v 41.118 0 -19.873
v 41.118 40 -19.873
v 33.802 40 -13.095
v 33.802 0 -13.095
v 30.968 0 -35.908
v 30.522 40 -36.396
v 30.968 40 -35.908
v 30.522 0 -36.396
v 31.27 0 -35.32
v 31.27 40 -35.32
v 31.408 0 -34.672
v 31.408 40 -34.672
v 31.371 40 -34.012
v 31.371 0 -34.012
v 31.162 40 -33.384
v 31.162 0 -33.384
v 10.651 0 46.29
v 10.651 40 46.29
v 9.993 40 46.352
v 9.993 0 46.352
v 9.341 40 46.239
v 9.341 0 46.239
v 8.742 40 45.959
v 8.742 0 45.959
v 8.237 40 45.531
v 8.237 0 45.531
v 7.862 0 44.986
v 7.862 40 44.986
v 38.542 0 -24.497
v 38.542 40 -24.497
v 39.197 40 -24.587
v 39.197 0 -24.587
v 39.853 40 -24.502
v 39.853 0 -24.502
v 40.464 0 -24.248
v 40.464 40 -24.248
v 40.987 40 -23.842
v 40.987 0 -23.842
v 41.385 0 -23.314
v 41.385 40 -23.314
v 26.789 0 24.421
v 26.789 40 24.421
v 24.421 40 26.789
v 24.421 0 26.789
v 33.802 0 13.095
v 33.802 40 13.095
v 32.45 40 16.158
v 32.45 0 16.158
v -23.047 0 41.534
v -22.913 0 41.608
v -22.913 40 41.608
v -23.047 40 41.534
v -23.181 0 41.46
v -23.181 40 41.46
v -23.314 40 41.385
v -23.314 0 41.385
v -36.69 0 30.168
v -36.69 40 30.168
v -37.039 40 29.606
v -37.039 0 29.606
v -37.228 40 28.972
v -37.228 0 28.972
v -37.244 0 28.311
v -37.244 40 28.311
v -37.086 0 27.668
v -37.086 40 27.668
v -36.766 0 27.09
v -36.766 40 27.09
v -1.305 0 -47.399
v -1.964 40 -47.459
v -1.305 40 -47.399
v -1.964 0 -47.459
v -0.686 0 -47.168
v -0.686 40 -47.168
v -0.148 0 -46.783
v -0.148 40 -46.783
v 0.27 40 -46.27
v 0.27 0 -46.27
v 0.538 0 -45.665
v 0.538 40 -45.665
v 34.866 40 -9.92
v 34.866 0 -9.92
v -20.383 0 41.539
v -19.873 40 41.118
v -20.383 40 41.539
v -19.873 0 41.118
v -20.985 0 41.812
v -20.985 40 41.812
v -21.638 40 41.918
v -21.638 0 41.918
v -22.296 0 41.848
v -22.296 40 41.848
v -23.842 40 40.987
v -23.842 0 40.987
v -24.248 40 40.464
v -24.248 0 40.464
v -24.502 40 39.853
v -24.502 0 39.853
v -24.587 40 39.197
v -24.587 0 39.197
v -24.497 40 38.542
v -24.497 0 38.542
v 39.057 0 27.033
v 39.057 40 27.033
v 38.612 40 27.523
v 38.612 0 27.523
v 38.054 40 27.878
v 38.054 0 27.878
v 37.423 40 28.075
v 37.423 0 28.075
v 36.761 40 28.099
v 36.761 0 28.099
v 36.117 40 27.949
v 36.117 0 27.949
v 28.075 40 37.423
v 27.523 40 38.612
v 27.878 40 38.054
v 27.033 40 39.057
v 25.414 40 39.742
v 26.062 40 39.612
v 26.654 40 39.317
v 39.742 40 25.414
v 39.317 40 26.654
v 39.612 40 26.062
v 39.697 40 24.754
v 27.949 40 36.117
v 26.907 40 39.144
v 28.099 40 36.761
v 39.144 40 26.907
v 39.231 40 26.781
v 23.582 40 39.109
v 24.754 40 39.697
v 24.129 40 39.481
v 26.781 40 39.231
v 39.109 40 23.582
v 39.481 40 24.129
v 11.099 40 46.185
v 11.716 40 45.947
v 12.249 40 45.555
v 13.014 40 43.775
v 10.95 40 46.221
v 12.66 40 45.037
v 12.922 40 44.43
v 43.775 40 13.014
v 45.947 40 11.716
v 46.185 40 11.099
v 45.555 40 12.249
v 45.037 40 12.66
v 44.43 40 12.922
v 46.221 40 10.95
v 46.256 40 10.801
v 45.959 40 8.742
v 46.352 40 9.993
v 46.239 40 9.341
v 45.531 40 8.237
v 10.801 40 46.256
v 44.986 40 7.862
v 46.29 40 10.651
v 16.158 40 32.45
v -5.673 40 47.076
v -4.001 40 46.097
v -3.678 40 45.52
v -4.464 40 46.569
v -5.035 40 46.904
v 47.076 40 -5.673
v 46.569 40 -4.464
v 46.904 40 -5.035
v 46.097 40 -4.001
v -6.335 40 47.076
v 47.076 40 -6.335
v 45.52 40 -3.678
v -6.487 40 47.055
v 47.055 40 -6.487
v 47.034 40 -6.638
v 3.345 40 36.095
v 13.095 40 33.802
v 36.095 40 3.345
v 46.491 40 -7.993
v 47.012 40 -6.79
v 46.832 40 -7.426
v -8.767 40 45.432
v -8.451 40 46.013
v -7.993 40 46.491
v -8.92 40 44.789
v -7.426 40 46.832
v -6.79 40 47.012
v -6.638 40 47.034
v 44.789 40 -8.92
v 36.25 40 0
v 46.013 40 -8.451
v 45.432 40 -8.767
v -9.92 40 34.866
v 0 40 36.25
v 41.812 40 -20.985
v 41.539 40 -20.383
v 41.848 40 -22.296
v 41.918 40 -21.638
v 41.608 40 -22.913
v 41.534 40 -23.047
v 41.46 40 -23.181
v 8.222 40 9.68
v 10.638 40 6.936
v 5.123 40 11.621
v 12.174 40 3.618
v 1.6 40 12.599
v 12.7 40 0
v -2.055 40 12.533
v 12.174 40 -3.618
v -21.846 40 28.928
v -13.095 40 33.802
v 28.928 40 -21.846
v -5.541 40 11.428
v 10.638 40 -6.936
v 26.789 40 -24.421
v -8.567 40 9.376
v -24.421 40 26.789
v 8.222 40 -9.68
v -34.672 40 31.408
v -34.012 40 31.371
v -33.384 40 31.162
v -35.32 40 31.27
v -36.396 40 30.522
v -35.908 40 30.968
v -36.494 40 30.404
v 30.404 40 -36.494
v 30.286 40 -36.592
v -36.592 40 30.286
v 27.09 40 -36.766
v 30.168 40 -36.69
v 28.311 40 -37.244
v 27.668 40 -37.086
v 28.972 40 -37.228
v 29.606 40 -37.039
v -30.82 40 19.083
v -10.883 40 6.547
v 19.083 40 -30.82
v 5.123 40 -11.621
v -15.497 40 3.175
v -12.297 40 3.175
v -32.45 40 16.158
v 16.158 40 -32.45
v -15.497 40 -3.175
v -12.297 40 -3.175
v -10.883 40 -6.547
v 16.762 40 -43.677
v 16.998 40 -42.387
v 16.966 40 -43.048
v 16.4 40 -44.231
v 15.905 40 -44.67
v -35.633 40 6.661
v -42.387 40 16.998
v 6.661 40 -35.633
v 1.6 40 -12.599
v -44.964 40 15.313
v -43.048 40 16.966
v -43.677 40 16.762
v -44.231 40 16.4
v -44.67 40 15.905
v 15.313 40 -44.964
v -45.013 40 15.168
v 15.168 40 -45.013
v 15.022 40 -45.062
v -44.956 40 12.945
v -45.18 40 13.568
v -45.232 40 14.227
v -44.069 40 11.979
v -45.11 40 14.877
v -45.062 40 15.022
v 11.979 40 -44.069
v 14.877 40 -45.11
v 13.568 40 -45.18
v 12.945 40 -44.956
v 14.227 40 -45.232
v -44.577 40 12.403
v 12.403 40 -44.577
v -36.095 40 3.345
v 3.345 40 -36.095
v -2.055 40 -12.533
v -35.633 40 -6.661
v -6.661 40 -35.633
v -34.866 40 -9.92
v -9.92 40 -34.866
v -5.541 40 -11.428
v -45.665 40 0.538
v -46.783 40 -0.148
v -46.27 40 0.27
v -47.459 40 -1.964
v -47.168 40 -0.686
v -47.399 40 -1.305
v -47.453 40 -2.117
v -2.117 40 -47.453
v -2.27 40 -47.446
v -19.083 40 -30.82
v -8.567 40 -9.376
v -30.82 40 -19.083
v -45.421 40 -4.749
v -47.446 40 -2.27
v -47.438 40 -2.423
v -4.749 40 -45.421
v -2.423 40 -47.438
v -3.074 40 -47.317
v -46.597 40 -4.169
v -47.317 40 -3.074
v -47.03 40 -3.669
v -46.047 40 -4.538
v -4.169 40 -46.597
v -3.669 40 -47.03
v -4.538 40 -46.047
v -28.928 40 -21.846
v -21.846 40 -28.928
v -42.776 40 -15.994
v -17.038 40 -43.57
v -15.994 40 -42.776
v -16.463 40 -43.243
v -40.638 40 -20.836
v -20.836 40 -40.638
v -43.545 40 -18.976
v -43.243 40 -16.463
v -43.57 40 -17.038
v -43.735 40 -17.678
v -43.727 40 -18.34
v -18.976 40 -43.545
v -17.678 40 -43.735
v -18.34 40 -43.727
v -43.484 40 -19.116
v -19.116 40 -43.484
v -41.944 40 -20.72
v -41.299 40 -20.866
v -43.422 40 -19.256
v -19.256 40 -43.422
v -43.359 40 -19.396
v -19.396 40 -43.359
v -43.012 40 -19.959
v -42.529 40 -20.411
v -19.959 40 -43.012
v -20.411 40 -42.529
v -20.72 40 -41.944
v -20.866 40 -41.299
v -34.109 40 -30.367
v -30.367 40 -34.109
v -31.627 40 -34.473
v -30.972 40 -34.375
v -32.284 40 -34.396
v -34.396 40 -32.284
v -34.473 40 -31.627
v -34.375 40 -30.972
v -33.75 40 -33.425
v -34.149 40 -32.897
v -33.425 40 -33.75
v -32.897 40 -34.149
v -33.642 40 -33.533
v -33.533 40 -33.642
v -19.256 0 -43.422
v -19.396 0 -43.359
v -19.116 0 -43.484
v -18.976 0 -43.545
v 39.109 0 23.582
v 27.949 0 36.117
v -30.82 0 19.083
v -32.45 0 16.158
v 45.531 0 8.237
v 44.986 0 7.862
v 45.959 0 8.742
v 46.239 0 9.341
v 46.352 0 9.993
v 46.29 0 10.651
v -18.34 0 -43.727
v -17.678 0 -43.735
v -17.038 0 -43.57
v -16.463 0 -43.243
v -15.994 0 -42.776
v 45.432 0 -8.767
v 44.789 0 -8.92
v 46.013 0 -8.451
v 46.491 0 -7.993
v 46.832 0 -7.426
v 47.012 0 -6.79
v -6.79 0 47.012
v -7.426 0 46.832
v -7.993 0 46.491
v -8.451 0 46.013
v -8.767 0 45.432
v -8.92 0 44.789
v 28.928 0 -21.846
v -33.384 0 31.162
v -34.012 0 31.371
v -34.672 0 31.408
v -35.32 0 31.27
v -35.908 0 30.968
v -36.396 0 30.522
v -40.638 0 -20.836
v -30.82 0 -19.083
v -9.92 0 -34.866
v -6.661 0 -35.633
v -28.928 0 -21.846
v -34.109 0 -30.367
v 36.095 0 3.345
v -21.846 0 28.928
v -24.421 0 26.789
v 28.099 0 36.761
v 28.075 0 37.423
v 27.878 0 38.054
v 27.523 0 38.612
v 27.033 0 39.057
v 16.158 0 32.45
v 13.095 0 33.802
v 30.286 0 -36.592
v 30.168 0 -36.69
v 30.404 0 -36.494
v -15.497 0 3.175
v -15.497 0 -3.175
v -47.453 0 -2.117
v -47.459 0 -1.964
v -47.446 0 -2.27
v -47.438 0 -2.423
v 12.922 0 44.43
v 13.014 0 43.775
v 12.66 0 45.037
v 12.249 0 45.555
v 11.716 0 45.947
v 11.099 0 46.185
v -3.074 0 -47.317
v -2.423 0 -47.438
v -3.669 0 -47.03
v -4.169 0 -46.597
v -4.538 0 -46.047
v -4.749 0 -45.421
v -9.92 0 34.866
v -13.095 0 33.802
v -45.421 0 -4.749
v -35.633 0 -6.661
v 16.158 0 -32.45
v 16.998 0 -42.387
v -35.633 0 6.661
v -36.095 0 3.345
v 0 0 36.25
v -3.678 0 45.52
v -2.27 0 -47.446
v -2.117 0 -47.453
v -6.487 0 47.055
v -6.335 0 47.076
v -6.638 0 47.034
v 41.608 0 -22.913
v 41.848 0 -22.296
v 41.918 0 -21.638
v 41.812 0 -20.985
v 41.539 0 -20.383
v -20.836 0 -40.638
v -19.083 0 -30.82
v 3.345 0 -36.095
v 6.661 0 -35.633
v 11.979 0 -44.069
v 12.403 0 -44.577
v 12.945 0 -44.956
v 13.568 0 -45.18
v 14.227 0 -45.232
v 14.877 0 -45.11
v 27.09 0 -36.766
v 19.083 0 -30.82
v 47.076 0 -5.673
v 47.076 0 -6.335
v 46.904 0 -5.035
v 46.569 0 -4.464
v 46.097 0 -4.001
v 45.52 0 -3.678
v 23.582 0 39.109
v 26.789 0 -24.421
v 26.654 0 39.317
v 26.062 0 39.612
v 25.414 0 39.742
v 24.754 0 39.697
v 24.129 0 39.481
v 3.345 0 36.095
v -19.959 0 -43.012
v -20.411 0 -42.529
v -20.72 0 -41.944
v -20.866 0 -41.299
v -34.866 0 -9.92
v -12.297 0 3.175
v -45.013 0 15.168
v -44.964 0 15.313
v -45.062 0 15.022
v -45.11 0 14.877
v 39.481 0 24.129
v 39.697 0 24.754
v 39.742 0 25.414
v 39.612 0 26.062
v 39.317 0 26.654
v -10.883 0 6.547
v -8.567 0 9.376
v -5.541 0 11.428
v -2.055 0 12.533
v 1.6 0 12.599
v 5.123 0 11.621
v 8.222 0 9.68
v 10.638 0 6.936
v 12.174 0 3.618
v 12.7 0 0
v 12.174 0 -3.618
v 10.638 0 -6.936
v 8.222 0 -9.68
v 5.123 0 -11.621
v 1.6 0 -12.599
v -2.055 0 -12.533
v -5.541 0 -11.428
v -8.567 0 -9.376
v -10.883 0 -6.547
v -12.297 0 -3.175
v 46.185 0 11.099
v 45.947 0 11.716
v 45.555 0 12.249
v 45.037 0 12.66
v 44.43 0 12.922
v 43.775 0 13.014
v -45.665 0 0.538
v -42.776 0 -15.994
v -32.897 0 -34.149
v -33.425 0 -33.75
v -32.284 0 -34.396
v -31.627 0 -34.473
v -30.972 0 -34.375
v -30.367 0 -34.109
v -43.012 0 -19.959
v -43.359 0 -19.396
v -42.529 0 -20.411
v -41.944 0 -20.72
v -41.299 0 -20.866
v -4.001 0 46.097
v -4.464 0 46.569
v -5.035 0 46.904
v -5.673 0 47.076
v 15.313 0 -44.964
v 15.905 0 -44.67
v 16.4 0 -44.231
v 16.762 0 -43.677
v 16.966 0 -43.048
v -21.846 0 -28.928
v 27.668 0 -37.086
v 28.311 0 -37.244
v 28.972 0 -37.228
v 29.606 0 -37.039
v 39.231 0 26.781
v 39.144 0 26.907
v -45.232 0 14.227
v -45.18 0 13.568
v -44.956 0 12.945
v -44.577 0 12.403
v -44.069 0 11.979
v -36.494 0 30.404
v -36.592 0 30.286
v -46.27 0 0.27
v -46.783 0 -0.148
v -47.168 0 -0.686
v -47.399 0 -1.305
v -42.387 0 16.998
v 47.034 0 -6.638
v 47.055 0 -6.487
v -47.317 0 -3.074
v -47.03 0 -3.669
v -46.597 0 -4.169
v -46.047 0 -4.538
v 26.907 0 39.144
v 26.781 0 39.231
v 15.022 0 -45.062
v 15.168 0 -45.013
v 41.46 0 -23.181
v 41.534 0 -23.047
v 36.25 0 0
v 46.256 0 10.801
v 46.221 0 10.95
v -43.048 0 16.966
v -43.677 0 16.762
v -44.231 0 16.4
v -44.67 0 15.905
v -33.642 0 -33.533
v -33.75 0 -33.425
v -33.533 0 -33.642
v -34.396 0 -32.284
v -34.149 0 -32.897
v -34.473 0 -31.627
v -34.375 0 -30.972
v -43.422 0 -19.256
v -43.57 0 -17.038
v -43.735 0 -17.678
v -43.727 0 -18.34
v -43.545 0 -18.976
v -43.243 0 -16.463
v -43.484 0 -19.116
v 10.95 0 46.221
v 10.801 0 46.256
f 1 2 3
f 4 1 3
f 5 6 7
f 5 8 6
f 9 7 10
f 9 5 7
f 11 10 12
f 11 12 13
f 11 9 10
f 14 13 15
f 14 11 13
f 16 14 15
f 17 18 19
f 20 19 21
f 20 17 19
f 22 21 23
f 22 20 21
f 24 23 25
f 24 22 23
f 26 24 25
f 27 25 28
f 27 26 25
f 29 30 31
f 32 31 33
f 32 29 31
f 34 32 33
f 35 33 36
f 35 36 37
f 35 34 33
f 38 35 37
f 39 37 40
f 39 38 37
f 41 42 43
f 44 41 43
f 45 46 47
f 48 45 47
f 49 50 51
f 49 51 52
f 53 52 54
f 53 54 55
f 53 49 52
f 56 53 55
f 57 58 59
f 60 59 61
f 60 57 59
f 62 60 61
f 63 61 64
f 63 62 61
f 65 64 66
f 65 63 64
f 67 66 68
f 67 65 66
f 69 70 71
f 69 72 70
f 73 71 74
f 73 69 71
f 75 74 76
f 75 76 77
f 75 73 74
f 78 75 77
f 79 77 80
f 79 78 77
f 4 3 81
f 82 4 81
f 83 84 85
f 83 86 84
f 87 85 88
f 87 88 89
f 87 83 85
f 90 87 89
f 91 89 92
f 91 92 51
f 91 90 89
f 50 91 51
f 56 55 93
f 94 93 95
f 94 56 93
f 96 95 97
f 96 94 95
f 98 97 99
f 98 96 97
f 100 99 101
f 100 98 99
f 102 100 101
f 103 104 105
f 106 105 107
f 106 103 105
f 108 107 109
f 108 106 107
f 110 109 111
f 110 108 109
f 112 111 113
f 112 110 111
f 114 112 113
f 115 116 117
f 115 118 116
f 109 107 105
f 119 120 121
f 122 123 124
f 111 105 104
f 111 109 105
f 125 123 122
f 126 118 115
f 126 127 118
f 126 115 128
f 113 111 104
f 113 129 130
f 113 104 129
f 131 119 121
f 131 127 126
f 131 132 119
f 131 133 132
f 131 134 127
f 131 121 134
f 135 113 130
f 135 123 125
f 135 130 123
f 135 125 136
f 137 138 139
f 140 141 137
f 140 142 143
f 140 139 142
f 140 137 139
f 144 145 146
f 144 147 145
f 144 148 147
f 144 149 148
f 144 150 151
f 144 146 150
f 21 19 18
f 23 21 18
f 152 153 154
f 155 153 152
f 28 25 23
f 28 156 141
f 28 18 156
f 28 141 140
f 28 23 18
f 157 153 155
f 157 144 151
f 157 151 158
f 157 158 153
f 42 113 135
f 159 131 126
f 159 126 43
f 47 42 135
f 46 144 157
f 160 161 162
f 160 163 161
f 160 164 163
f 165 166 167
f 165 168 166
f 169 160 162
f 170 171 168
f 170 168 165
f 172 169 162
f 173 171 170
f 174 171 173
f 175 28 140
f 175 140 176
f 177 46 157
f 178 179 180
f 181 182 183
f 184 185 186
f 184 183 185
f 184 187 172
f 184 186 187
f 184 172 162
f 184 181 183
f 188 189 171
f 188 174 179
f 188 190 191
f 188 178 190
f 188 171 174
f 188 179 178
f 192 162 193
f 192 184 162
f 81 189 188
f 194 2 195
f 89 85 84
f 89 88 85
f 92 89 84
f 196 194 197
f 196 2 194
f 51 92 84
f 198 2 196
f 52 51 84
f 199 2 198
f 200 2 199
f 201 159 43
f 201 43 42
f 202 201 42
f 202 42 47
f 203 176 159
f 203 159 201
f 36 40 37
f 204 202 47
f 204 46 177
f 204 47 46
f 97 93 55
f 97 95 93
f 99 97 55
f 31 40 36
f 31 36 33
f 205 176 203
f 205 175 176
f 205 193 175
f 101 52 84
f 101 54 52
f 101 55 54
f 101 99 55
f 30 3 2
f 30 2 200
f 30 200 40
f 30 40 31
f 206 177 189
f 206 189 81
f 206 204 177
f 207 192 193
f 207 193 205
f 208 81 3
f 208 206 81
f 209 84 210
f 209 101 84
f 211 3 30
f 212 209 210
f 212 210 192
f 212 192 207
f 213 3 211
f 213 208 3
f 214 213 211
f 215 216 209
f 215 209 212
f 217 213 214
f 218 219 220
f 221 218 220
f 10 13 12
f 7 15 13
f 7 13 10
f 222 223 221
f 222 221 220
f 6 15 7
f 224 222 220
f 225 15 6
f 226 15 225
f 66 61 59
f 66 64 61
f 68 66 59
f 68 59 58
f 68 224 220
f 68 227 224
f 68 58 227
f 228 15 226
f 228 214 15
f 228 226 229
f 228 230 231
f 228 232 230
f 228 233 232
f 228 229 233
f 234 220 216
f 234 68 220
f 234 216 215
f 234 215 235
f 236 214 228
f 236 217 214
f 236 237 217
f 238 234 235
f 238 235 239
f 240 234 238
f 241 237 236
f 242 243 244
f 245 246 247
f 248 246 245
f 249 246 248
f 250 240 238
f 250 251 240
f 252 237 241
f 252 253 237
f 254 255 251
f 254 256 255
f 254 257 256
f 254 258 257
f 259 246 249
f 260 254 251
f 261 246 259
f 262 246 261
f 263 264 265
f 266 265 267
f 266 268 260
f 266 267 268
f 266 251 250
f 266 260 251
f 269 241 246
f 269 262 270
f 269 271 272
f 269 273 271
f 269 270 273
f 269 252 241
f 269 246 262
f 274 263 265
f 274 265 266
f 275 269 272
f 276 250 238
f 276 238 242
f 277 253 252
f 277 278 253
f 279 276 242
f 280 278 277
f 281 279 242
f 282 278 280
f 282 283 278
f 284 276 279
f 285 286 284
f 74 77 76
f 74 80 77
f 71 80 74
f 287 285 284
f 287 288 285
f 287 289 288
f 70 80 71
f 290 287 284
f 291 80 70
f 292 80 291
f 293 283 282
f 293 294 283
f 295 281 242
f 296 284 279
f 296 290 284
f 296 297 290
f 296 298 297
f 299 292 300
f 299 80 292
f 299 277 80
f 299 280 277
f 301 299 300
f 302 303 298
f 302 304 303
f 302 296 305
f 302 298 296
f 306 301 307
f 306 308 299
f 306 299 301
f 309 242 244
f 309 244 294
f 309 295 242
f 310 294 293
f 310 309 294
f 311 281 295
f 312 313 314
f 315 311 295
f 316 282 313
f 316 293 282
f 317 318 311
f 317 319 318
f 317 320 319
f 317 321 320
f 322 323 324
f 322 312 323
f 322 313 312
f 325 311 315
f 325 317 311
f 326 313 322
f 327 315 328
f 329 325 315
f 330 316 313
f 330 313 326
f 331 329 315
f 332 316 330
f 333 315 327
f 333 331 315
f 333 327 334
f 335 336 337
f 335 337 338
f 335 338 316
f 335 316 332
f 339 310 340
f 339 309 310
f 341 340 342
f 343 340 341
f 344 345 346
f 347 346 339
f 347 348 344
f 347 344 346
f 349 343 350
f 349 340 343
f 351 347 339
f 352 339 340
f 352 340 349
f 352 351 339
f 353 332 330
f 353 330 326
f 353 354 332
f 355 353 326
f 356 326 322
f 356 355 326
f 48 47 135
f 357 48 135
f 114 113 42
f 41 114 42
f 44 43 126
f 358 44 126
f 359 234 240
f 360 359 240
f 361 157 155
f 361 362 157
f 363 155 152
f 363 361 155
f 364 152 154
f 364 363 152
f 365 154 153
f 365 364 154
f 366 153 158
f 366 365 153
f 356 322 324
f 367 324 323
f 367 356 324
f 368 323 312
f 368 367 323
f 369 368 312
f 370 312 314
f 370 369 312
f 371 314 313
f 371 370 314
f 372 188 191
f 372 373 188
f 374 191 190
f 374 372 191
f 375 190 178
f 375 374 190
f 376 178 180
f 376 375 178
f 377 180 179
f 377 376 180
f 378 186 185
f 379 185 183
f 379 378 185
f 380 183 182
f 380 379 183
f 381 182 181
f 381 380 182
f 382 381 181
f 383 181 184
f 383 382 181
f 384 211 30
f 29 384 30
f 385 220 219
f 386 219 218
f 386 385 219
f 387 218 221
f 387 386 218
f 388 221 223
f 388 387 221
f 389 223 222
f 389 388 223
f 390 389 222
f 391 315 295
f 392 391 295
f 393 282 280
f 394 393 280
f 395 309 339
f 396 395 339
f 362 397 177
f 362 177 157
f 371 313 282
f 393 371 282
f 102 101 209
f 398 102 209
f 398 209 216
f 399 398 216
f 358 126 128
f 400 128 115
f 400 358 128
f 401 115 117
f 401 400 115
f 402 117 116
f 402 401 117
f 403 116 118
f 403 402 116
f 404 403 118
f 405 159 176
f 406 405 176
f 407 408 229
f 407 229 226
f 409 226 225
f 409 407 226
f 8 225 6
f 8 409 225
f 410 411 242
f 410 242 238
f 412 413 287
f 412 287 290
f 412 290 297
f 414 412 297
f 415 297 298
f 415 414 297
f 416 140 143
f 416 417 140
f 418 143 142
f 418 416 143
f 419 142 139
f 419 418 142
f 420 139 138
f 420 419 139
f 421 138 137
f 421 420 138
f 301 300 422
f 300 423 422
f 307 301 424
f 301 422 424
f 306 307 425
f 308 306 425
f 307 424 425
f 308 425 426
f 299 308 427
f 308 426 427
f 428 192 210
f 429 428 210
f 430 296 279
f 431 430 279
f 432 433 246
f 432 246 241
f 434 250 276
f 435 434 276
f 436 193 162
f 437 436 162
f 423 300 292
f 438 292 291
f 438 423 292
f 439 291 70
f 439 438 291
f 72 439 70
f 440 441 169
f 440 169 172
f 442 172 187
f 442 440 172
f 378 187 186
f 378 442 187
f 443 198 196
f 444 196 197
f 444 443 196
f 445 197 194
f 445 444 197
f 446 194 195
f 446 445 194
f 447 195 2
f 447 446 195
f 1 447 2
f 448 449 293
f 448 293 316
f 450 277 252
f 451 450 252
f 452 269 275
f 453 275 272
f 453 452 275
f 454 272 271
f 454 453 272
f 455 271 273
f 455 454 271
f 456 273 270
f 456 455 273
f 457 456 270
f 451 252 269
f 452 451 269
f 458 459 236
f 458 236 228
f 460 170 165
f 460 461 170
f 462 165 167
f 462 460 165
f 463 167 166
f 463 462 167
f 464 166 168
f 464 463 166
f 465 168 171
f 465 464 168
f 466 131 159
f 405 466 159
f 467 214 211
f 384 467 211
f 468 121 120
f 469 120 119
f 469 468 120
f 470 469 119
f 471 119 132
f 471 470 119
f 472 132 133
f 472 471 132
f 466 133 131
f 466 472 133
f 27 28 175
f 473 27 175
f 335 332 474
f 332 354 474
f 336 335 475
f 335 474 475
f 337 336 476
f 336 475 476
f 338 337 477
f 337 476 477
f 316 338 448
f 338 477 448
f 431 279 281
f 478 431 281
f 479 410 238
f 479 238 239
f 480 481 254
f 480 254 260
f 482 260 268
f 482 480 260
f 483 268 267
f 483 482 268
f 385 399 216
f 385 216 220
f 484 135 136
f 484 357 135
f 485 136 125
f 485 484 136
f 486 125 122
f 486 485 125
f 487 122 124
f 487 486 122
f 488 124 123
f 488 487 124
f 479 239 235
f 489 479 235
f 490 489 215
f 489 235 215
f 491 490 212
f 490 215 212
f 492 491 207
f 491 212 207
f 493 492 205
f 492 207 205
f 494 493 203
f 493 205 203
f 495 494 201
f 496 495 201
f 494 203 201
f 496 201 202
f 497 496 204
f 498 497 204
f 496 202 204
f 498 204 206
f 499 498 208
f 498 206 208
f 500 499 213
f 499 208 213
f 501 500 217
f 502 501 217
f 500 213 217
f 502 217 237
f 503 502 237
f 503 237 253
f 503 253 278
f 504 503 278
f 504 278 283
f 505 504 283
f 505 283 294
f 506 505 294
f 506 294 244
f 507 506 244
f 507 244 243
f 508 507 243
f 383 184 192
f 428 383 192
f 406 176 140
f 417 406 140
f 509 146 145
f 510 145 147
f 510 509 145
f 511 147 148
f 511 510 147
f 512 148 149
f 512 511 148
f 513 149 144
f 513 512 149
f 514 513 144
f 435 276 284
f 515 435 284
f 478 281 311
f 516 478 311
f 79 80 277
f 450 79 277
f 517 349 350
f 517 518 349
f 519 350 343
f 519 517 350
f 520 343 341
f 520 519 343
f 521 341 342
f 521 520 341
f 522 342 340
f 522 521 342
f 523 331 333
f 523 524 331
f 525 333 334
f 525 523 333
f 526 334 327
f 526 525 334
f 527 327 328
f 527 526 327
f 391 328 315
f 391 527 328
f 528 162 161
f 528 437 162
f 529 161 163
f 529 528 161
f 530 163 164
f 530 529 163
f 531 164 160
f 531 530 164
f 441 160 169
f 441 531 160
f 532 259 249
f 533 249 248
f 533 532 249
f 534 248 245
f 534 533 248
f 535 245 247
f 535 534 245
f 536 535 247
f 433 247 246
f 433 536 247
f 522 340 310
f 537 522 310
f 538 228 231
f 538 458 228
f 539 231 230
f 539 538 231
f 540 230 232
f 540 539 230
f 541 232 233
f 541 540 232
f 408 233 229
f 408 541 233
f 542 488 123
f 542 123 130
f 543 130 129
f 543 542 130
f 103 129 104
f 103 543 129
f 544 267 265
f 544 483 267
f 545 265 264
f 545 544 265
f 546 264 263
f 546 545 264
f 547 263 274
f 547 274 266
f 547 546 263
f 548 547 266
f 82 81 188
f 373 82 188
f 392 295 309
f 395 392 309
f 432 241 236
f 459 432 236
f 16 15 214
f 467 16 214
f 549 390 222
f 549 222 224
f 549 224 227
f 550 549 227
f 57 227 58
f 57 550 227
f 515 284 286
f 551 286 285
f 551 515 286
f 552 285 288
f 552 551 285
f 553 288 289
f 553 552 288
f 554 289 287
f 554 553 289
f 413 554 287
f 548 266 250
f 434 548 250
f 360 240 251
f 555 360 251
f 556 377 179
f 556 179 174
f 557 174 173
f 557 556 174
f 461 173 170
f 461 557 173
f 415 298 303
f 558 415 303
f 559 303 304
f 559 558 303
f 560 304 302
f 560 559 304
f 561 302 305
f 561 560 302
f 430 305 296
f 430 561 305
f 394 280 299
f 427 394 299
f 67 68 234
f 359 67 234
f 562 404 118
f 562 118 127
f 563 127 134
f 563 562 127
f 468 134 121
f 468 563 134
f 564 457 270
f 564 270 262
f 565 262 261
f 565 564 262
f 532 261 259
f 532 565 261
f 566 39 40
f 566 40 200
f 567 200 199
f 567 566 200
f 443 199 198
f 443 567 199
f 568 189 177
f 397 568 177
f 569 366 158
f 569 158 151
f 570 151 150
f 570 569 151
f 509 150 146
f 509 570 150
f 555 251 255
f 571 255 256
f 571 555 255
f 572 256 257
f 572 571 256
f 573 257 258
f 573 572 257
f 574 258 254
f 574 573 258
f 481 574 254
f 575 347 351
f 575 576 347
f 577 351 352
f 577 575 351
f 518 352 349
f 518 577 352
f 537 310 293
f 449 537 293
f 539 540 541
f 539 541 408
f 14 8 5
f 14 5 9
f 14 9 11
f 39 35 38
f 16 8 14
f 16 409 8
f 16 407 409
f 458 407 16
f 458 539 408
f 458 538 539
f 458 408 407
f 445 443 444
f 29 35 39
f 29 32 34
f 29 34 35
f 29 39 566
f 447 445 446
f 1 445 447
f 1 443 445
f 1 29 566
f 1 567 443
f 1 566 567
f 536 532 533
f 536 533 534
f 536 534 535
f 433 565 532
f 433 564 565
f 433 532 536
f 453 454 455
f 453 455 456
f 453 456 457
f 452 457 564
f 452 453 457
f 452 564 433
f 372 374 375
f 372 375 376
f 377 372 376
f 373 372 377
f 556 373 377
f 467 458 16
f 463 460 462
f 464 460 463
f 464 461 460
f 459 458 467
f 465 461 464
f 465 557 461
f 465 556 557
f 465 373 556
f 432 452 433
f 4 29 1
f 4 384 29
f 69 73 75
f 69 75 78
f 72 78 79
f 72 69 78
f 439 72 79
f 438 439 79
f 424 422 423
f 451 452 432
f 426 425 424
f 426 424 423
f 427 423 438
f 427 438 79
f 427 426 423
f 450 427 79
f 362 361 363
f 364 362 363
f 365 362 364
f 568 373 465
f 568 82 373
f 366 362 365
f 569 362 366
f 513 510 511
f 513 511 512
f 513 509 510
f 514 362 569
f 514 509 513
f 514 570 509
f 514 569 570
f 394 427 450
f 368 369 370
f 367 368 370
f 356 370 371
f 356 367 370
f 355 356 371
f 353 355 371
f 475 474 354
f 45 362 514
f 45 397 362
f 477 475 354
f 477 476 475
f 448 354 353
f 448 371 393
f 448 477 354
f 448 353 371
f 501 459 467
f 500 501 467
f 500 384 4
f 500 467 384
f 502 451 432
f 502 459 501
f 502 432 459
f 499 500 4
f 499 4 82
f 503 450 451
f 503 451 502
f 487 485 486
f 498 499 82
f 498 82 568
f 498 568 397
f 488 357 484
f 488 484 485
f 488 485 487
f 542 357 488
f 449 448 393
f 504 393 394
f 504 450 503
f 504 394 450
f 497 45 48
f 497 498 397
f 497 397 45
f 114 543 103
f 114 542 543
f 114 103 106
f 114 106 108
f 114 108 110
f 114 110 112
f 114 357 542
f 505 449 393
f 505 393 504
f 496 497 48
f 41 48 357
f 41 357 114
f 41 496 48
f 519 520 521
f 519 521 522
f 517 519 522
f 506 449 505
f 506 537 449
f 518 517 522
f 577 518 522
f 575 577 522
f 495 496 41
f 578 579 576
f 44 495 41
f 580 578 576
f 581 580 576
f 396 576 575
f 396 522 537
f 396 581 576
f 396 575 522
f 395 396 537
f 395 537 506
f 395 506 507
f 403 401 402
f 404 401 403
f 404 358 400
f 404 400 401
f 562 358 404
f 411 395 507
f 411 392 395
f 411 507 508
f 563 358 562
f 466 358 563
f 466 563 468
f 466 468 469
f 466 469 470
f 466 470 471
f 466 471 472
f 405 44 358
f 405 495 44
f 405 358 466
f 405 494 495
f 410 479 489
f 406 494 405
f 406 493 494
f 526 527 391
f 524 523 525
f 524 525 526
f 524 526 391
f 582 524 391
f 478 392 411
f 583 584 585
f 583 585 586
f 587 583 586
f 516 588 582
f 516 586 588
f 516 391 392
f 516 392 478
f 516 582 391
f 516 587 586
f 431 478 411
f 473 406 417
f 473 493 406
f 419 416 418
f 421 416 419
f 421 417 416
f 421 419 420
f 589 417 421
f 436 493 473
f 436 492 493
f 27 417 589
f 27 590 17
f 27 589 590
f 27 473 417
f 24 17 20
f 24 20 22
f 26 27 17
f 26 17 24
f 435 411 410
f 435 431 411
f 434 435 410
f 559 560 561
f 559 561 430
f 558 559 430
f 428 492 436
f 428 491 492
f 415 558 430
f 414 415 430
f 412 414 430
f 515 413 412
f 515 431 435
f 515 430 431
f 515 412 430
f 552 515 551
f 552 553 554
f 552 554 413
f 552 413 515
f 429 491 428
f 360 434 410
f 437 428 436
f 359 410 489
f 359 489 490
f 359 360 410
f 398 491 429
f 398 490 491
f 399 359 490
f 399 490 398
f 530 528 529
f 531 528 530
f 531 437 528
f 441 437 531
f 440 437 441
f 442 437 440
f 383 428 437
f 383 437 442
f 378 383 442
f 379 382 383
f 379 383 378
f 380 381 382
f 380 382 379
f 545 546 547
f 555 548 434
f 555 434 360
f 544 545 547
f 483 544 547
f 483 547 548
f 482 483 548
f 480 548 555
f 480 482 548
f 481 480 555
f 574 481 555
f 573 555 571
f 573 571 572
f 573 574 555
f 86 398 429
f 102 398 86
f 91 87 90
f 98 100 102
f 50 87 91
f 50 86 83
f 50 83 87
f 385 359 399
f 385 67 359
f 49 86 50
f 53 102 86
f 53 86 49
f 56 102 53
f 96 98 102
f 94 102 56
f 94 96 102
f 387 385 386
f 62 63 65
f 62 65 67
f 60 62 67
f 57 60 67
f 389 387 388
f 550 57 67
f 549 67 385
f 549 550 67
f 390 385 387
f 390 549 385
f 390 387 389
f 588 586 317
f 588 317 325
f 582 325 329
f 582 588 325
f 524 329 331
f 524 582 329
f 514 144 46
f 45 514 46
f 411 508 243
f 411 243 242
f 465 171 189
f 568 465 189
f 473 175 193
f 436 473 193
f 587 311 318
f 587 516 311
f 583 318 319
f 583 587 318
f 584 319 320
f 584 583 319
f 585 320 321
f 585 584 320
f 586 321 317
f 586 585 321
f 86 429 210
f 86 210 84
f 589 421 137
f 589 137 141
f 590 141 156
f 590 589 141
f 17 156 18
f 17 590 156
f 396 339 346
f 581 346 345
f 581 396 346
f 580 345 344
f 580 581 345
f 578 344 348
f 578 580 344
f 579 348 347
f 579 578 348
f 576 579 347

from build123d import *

# Parameters (mm, degrees)
ENL_V_MAT_EXTRU_3_DEPTH            = 79.182478856
CONG_1_R                           = 2.5
R_P_TITION_CIRCULAIRE1_COUNT       = 17
CONG_1_OF_R_P_TITION_CIRCULAIRE1_R = 2.5
ENL_V_MAT_EXTRU_4_DEPTH            = 79.135714235


with BuildPart() as part:
    # Esquisse1 → Révolution1 (revolve)
    with BuildSketch(Plane.XY, mode=Mode.PRIVATE) as r_volution1_sk:
        Polygon((-47.5, 40), (-47.5, 0), (-40, 0), (0, 0), (0, 40), (-40, 40), align=None)
    revolve(r_volution1_sk.sketch.rotate(Axis((0, 40, 0), (0, -1, 0)), 270), axis=Axis((0, 40, 0), (0, -1, 0)))

    # Esquisse5 → Enlèv. mat.-Extru.3 (cut, through all)
    with BuildSketch(Plane(origin=(0, 40, 0), x_dir=(1, 0, 0), z_dir=(0, 1, 0))):
        with BuildLine():
            ThreePointArc((-4.382747075, 47.297373374), (-10.875151123, 46.238307582), (-17.158979144, 44.292430897))
            Line((-17.158979144, 44.292430897), (-9.920283391, 34.866179565))
            Line((-9.920283391, 34.866179565), (-6.660920021, 35.632774863))
            Line((-6.660920021, 35.632774863), (-4.382747075, 47.297373374))
        make_face()
    enl_v_mat_extru_3 = extrude(amount=-ENL_V_MAT_EXTRU_3_DEPTH, mode=Mode.SUBTRACT)

    # Congé1
    cong_1_edges = [part.edges().sort_by_distance(p)[0] for p in [
        (-17.158979144, 20, -44.292430897),
        (-4.382747075, 20, -47.297373374),
    ]]
    fillet(cong_1_edges, radius=CONG_1_R)

    # Répétition circulaire1: Enlèv. mat.-Extru.3 ×17 about axis
    r_p_tition_circulaire1_axis = Axis((0, 0, 0), (0, 1, 0))
    for i in range(1, R_P_TITION_CIRCULAIRE1_COUNT):
        add(enl_v_mat_extru_3.rotate(r_p_tition_circulaire1_axis, i * 360 / R_P_TITION_CIRCULAIRE1_COUNT), mode=Mode.SUBTRACT)

    # Congé1 of Répétition circulaire1
    cong_1_of_r_p_tition_circulaire1_edges = [part.edges().sort_by_distance(p)[0] for p in [
        (-32.000543073, 20, -35.102923568),
        (-21.1725719, 20, -42.520256339),
        (-42.520256339, 20, -21.172571899),
        (-35.102923568, 20, -32.000543073),
        (-47.297373374, 20, -4.382747075),
        (-44.292430897, 20, -17.158979144),
        (-45.686718051, 20, 12.998992028),
        (-47.5, 20, 0),
        (-37.905818296, 20, 28.625145228),
        (-44.292430897, 20, 17.158979144),
        (-25.005527737, 20, 40.385313947),
        (-35.102923568, 20, 32.000543073),
        (-8.728102096, 20, 46.691222235),
        (-21.172571899, 20, 42.52025634),
        (8.728102096, 20, 46.691222235),
        (-4.382747074, 20, 47.297373374),
        (25.005527737, 20, 40.385313947),
        (12.998992029, 20, 45.686718051),
        (37.905818296, 20, 28.625145228),
        (28.625145228, 20, 37.905818296),
        (45.686718051, 20, 12.998992028),
        (40.385313947, 20, 25.005527736),
        (47.297373374, 20, -4.382747075),
        (46.691222235, 20, 8.728102096),
        (42.520256339, 20, -21.172571899),
        (46.691222235, 20, -8.728102097),
        (32.000543073, 20, -35.102923568),
        (40.385313947, 20, -25.005527737),
        (17.158979144, 20, -44.292430897),
        (28.625145228, 20, -37.905818296),
        (0, 20, -47.5),
        (12.998992028, 20, -45.686718051),
    ]]
    fillet(cong_1_of_r_p_tition_circulaire1_edges, radius=CONG_1_OF_R_P_TITION_CIRCULAIRE1_R)

    # Esquisse6 → Enlèv. mat.-Extru.4 (cut, through all)
    with BuildSketch(Plane(origin=(0, 40, 0), x_dir=(1, 0, 0), z_dir=(0, 1, 0))):
        with BuildLine():
            Line((-12.296722124, 3.175), (-15.496722124, 3.175))
            Line((-15.496722124, 3.175), (-15.496722124, -3.175))
            Line((-15.496722124, -3.175), (-12.296722124, -3.175))
            ThreePointArc((-12.296722124, -3.175), (12.7, 0), (-12.296722124, 3.175))
        make_face()
    extrude(amount=-ENL_V_MAT_EXTRU_4_DEPTH, mode=Mode.SUBTRACT)


solid = part.part
